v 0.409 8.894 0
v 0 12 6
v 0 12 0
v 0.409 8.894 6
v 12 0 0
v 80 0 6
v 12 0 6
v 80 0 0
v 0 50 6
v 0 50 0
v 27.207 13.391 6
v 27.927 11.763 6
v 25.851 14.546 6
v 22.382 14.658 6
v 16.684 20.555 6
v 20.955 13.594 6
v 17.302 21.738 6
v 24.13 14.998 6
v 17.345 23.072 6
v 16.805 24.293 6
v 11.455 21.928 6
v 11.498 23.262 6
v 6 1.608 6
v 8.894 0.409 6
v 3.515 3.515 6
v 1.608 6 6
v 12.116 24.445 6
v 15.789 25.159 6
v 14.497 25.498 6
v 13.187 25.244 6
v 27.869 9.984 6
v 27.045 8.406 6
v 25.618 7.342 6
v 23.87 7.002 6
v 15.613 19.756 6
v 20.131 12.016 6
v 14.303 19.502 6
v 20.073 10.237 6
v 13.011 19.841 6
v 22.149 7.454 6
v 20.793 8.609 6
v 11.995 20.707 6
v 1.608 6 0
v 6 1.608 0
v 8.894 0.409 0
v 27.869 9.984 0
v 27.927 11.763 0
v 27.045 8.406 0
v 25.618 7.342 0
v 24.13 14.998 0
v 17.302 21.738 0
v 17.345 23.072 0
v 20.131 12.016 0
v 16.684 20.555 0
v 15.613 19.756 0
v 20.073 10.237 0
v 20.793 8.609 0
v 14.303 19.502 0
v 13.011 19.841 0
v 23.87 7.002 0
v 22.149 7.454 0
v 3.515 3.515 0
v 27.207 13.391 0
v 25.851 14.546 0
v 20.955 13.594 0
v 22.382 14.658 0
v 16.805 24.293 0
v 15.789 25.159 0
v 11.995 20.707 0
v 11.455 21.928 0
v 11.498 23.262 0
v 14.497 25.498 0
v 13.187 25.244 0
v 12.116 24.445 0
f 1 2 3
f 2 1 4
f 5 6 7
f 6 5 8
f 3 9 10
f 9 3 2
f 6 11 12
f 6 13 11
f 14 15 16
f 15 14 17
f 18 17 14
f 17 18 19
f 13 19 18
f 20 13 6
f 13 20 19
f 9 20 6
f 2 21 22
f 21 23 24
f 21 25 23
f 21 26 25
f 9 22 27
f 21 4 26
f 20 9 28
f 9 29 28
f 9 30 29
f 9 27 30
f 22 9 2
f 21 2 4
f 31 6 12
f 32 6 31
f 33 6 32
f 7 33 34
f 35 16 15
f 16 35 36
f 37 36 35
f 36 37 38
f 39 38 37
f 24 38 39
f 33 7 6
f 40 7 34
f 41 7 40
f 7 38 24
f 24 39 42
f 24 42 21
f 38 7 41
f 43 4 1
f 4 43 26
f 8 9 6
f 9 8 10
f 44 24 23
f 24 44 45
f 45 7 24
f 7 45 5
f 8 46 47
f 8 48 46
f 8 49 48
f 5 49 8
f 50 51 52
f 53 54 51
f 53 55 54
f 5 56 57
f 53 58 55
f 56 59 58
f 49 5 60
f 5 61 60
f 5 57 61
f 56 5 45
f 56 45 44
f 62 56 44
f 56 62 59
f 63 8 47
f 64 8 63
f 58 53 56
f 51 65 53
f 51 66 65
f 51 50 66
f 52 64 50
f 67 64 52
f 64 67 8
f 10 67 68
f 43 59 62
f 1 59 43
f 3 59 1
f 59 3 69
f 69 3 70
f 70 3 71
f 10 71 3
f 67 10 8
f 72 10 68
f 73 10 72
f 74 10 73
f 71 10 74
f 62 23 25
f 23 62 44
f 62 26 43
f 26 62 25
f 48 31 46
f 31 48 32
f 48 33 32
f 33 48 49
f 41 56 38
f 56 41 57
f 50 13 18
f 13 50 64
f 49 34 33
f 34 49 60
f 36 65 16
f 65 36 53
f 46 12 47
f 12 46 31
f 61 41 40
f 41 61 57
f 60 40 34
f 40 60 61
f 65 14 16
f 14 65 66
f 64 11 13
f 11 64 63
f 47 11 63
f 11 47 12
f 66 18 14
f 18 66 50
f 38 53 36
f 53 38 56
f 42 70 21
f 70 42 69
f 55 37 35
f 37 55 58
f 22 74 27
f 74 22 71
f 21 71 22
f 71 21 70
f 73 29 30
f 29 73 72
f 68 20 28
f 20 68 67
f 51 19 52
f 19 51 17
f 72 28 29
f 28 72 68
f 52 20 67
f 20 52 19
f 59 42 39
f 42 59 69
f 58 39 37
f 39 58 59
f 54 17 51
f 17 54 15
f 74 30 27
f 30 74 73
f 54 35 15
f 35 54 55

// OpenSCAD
$fn = 32;

// ----------------------------------------------------------------------
// Bracket plate: corner pad 80 x 50, fillet R12
// ----------------------------------------------------------------------

// --- parameters (mm) ---
hole_r = 3;               // bolt hole radius
plate_t = 6;              // plate thickness, Z (extrusion height)
leg_a = 80;               // base leg
leg_b = 50;               // height leg
fillet_r = 12;            // right-angle fillet radius

hole_d1 = 2 * hole_r + 2;
hole_d2 = 2 * hole_r;

profile = [[12, 0], [80, 0], [0, 50], [0, 12], [0.409, 8.894], [1.608, 6], [3.515, 3.515], [6, 1.608], [8.894, 0.409]];  // primary outline, 9 points, counter clockwise
void_1 = [[27.927, 11.763], [27.207, 13.391], [25.851, 14.546], [24.13, 14.998], [22.382, 14.658], [20.955, 13.594], [20.131, 12.016], [20.073, 10.237], [20.793, 8.609], [22.149, 7.454], [23.87, 7.002], [25.618, 7.342], [27.045, 8.406], [27.869, 9.984]];  // mount hole 1, 14 points
void_2 = [[17.345, 23.072], [16.805, 24.293], [15.789, 25.159], [14.497, 25.498], [13.187, 25.244], [12.116, 24.445], [11.498, 23.262], [11.455, 21.928], [11.995, 20.707], [13.011, 19.841], [14.303, 19.502], [15.613, 19.756], [16.684, 20.555], [17.302, 21.738]];  // mount hole 2, 14 points

// --- the one profile operation ---
difference() {
  linear_extrude(height = plate_t) polygon(points = profile);
  translate([0, 0, -1])
    linear_extrude(height = plate_t + 2) polygon(points = void_1);
  translate([0, 0, -1])
    linear_extrude(height = plate_t + 2) polygon(points = void_2);
}
